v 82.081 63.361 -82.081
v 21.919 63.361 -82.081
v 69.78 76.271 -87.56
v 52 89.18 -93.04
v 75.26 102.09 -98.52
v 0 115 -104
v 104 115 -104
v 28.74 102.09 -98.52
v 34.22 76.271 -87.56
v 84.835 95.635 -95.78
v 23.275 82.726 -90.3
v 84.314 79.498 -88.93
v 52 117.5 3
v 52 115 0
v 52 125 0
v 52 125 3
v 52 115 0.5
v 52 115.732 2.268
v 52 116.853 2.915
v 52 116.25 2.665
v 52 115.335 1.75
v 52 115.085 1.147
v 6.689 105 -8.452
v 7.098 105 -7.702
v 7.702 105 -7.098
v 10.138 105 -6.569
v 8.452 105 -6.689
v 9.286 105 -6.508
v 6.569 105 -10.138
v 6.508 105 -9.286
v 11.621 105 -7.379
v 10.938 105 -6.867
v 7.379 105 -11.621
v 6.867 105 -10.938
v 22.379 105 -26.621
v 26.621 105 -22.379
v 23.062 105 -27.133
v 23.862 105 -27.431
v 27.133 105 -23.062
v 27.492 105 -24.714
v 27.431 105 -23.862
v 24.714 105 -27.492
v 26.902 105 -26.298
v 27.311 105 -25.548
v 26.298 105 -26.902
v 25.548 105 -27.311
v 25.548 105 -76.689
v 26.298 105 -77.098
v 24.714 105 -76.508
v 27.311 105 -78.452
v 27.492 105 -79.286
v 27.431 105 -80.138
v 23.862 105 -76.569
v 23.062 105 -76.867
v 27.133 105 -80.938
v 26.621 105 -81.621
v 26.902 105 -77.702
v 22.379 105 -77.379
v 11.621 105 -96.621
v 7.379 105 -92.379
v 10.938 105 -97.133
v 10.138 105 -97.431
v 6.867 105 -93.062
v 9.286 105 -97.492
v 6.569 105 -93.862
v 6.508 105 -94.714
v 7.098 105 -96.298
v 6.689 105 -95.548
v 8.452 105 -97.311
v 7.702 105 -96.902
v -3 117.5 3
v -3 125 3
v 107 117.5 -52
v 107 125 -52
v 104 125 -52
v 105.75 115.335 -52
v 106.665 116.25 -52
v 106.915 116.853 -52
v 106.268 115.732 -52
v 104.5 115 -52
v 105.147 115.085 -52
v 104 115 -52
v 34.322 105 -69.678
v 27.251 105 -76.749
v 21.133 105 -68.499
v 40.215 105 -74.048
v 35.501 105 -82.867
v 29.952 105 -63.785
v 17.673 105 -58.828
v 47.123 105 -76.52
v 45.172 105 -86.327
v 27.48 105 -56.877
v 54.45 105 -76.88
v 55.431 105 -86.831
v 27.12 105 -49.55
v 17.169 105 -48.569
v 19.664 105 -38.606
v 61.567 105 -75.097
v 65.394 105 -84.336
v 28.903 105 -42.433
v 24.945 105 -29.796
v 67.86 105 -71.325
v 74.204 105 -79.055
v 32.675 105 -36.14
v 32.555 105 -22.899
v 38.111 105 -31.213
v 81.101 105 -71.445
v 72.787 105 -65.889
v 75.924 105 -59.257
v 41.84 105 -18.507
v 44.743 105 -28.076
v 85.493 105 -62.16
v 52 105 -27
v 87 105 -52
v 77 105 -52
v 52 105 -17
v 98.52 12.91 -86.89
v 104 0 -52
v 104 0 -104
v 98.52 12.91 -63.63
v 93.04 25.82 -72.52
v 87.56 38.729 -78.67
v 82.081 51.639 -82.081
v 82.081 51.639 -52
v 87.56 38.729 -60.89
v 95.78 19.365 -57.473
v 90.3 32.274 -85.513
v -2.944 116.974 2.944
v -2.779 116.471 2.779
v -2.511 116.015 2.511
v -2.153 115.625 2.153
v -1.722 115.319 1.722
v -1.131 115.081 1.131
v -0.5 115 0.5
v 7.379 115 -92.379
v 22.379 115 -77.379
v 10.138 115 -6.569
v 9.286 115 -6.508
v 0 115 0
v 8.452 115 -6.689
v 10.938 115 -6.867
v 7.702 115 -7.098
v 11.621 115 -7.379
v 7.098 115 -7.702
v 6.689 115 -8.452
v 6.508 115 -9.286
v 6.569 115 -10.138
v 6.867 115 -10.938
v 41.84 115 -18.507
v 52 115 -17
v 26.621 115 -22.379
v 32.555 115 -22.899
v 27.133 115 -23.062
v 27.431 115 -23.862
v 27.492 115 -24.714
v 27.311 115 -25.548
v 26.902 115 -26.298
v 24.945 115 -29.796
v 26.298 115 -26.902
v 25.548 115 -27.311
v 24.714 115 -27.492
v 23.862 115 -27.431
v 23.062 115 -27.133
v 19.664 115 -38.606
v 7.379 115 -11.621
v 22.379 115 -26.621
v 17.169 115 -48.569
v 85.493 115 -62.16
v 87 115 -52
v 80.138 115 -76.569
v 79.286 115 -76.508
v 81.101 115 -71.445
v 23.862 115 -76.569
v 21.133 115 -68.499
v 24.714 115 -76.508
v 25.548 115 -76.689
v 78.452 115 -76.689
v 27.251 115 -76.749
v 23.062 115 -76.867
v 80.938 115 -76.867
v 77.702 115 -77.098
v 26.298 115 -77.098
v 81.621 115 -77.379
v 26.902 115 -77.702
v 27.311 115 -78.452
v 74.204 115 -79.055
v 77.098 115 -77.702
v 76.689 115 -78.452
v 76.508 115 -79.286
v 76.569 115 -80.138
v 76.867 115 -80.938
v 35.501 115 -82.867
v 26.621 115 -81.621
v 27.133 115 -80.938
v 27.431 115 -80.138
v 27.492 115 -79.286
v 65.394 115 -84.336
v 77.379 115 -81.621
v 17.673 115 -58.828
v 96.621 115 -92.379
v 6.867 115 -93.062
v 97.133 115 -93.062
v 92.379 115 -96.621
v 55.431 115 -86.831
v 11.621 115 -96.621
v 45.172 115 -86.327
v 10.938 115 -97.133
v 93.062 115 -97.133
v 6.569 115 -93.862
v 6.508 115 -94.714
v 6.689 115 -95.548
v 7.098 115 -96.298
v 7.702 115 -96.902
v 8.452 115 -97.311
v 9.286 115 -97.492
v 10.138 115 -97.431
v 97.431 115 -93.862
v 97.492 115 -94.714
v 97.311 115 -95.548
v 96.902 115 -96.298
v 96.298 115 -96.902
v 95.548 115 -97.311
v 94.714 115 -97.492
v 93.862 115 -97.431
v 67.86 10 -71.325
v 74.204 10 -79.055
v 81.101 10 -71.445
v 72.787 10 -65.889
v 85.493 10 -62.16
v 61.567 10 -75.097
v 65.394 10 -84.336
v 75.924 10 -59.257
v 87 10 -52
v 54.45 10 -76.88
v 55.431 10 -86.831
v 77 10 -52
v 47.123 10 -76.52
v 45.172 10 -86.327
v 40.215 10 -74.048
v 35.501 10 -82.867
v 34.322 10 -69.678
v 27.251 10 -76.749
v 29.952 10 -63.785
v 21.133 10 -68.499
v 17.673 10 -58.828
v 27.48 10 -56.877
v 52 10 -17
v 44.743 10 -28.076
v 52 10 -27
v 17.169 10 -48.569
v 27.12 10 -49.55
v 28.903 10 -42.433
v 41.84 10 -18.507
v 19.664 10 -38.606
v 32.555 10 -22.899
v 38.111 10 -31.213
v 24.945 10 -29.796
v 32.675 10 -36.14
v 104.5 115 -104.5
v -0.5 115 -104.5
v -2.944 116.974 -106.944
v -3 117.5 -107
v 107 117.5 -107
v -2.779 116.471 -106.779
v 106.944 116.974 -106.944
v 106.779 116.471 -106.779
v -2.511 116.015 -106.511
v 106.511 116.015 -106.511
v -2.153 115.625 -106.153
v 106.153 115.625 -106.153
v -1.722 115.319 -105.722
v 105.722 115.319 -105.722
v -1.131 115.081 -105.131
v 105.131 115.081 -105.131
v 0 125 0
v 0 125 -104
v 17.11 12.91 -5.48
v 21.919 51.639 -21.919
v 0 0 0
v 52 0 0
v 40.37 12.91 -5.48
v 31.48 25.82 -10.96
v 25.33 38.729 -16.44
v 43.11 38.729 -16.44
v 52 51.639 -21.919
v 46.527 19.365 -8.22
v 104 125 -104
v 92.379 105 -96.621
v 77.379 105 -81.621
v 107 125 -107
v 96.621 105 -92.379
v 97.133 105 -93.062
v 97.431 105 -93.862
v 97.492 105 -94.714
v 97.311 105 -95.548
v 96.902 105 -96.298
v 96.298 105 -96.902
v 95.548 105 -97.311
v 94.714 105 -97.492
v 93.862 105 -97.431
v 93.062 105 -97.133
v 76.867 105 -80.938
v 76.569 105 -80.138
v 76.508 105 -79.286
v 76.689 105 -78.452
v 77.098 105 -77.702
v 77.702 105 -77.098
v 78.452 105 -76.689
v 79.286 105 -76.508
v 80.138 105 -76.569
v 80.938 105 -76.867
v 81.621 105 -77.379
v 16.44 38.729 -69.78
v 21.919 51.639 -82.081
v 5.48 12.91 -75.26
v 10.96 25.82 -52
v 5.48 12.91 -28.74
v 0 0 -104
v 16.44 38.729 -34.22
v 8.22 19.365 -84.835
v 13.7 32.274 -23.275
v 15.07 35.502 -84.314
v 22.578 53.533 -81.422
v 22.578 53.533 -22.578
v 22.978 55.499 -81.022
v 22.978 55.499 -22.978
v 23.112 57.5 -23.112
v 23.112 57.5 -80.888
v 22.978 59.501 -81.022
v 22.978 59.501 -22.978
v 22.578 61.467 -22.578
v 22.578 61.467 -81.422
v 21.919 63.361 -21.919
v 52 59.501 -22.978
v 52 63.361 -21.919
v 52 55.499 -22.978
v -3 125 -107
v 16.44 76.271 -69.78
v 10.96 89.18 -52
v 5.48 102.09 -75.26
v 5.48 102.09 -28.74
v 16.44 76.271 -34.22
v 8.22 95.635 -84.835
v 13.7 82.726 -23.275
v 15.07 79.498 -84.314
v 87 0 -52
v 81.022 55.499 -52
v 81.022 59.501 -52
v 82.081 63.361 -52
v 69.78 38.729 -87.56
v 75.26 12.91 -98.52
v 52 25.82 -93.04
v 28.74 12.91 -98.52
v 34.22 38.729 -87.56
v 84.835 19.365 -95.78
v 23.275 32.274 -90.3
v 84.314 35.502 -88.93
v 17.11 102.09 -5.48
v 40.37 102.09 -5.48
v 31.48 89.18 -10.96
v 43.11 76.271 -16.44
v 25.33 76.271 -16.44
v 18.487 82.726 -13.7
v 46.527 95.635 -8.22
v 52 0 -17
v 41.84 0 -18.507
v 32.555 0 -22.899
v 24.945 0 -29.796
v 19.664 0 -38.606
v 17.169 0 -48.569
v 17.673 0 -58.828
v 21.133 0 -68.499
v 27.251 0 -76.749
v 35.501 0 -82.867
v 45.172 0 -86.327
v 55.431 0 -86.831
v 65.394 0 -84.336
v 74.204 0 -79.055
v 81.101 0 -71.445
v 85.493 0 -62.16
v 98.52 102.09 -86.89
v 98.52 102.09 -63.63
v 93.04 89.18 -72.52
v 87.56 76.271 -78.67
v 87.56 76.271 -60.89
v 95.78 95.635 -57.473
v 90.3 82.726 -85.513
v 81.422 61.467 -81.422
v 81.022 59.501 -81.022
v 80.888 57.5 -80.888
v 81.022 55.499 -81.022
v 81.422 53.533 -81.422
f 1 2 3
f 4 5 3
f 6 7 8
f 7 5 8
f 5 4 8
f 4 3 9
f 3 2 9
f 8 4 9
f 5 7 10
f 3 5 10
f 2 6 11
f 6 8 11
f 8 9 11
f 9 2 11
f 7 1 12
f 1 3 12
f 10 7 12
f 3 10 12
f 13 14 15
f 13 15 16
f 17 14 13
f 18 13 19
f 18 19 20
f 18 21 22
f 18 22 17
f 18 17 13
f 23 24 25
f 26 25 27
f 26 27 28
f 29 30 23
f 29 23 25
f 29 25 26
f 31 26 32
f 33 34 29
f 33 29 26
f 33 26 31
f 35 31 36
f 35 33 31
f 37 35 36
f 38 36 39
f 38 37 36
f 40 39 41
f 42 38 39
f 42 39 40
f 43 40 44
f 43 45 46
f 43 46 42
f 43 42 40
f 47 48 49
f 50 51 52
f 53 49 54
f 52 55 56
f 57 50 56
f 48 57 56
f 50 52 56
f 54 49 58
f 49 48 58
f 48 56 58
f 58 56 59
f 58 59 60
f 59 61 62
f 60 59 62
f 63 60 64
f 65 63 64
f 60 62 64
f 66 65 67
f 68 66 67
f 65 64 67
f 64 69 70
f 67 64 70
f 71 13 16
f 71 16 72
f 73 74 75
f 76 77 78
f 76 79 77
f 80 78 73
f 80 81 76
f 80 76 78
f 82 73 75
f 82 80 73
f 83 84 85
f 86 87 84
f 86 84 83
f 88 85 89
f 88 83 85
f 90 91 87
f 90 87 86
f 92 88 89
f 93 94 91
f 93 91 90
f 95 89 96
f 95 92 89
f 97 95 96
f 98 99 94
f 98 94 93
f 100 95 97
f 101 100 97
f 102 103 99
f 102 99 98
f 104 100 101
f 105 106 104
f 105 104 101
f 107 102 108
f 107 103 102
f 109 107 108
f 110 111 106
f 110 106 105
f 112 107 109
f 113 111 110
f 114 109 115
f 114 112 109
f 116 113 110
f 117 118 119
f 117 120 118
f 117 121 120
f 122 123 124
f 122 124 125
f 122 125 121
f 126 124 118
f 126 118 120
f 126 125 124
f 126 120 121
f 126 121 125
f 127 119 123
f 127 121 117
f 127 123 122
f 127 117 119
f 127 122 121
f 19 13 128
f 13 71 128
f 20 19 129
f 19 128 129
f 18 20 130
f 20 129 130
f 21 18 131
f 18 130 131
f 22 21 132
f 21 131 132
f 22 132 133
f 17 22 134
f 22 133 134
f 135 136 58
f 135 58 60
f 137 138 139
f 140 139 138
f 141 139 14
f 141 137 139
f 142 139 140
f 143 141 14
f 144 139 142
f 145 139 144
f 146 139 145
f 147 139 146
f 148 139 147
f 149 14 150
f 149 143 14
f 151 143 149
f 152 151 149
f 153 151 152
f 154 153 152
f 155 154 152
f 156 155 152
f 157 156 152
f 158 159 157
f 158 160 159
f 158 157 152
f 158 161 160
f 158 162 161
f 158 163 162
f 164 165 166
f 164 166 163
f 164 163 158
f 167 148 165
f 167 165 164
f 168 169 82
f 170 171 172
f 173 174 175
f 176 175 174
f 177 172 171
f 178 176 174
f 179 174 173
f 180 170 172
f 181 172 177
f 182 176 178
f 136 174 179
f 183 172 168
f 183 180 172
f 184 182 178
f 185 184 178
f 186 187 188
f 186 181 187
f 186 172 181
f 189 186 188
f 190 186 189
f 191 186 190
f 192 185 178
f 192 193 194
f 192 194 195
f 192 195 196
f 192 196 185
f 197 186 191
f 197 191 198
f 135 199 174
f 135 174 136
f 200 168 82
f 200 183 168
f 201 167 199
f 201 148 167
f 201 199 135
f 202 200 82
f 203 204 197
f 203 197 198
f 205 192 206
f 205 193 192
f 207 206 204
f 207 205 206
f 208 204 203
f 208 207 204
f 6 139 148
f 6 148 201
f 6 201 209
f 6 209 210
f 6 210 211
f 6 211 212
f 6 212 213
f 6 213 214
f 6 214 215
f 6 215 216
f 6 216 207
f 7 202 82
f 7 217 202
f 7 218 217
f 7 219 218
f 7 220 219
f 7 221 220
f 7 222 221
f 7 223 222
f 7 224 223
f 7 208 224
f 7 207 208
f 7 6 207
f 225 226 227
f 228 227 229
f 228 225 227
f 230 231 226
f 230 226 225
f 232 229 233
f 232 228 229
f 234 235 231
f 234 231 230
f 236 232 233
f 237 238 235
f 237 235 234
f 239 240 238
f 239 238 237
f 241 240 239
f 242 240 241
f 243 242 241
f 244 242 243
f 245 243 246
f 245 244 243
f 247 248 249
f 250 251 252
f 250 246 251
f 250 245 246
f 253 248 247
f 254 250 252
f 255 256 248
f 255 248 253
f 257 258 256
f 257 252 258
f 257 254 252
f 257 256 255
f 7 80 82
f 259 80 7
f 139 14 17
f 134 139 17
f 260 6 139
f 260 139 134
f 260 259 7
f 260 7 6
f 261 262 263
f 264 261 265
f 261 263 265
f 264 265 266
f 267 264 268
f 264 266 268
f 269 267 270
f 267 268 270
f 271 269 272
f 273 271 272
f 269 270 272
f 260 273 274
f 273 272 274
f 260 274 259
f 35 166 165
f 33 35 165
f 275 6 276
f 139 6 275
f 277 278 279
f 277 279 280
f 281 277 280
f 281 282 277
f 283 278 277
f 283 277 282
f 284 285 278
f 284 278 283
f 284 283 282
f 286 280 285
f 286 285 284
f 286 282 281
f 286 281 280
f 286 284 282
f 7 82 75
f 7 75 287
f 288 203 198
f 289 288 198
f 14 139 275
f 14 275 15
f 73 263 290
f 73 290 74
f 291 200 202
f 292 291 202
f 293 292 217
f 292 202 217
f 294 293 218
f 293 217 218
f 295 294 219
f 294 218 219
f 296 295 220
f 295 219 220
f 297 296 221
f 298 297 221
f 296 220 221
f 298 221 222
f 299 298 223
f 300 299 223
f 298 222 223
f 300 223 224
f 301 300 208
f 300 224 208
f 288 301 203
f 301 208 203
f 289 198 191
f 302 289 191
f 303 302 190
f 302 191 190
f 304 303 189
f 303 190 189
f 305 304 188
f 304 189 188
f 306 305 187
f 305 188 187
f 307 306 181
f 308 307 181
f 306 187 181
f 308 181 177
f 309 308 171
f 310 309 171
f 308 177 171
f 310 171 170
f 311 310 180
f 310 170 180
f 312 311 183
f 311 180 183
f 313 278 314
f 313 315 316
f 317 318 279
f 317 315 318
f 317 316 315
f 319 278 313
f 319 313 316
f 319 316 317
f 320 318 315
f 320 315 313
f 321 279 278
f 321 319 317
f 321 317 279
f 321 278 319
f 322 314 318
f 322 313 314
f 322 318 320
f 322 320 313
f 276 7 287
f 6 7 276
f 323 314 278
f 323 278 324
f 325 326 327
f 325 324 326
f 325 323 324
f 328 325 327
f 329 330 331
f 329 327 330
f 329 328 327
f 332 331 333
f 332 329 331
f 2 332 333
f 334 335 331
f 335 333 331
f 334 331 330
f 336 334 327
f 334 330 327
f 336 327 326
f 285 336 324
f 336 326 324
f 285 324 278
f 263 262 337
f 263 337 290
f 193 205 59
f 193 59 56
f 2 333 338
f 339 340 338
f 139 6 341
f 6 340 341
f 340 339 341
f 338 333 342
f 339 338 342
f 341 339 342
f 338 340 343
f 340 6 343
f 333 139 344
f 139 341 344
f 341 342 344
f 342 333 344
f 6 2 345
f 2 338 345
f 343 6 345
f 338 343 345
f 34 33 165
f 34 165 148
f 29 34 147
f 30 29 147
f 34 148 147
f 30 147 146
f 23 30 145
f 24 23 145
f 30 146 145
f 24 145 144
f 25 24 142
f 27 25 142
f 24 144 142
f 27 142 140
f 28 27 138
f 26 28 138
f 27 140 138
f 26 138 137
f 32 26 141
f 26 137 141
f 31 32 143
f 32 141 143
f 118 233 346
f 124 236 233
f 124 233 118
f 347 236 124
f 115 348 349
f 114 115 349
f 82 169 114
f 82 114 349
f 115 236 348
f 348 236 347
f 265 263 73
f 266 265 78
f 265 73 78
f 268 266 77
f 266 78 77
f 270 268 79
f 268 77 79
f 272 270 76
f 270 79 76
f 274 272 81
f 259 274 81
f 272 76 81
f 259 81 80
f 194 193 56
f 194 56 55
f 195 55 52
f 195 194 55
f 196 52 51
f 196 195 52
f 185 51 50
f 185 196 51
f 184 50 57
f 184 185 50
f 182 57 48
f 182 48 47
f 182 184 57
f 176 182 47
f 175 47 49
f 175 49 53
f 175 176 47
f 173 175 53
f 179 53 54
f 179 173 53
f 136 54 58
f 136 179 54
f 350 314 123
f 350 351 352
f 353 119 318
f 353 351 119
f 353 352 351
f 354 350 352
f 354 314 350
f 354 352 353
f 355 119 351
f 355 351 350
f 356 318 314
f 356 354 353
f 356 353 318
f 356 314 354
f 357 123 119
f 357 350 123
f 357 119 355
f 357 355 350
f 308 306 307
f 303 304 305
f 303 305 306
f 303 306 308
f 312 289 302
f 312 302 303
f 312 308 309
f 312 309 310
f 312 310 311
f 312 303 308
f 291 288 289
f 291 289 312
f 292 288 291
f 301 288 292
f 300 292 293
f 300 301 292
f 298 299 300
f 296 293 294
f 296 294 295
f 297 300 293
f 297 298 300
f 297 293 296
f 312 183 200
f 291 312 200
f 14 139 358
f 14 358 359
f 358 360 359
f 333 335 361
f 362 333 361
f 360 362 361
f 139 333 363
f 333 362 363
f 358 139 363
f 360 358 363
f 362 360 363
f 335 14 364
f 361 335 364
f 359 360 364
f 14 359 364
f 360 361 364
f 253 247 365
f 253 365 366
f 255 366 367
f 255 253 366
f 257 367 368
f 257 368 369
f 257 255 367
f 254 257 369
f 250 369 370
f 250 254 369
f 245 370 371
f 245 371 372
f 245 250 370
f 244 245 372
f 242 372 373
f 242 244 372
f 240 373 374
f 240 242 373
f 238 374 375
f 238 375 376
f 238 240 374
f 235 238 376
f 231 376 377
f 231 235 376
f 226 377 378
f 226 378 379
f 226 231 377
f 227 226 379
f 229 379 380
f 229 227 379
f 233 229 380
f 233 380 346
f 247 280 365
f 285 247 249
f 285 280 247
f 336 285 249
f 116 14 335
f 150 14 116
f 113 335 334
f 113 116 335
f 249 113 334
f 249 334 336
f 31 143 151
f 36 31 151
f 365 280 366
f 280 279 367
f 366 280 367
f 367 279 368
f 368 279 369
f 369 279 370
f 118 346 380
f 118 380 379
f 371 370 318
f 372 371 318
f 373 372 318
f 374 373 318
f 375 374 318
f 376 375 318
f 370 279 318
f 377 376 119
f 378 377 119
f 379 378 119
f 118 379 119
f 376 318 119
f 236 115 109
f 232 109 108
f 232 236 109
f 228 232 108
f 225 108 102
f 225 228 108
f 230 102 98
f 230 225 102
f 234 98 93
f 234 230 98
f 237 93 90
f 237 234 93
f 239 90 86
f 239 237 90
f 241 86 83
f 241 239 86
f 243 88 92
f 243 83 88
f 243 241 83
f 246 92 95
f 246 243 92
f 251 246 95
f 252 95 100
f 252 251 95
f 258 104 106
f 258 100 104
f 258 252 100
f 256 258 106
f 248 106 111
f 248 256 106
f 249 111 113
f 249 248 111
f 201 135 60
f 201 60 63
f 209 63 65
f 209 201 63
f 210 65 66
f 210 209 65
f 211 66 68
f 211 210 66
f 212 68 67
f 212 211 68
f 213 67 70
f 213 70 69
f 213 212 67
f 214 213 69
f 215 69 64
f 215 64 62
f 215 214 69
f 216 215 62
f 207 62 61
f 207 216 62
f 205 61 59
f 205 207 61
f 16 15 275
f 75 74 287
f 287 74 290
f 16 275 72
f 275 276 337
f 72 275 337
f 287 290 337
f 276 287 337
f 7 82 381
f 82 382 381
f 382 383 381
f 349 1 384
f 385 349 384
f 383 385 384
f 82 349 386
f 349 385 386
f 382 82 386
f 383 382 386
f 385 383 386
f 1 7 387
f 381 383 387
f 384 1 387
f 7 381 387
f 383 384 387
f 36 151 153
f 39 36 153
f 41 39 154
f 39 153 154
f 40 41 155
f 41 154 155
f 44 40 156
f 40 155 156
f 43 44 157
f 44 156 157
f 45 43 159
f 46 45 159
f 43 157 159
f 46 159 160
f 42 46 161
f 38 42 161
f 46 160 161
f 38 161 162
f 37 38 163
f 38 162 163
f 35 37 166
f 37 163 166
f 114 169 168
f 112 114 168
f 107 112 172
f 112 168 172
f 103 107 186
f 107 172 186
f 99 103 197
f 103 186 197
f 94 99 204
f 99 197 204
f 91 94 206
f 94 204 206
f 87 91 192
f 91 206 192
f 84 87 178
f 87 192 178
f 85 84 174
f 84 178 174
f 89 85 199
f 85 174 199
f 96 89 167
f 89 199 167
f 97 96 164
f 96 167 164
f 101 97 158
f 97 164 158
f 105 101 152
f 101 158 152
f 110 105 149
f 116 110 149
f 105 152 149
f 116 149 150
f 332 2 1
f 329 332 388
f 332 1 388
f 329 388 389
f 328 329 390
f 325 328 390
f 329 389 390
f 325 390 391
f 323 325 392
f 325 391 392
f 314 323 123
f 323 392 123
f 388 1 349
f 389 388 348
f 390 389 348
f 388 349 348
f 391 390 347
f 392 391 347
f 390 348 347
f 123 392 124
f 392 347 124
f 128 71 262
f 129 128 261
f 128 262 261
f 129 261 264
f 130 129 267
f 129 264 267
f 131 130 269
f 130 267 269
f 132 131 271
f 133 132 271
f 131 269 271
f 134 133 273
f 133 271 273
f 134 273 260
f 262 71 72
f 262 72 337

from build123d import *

# Parameters (mm, degrees)
SKETCH2_W               = 104
SKETCH2_H               = 104
BOSS_EXTRUDE1_DEPTH     = 57.5
BOSS_EXTRUDE1_TAPER     = 23
CUT_EXTRUDE1_DEPTH      = 187.700294763
CUT_EXTRUDE1_DEPTH_BACK = 187.700294763
SKETCH4_R               = 25
FILLET1_R               = 15
SKETCH5_R               = 35
CUT_EXTRUDE2_DEPTH      = 10
CUT_EXTRUDE3_START      = -10
SKETCH6_R               = 35
CUT_EXTRUDE3_DEPTH      = 10
SKETCH7_W               = 52
SKETCH7_H               = 52
CUT_EXTRUDE4_DEPTH      = 187.700294763
BOSS_EXTRUDE3_DEPTH     = 10
FILLET12_R              = 2.5
CUT_EXTRUDE5_DEPTH      = 10


with BuildPart() as part:
    # Sketch2 → Boss-Extrude1 (new body)
    with BuildSketch(Plane(origin=(0, 0, 0), x_dir=(1, 0, 0), z_dir=(0, 1, 0))):
        with Locations((52, 52)):
            Rectangle(SKETCH2_W, SKETCH2_H)
    extrude(amount=BOSS_EXTRUDE1_DEPTH, taper=BOSS_EXTRUDE1_TAPER)

    # Mirror2: part across plane


with BuildPart() as part_1:
    add(part.part)
    add(part.part.mirror(Plane(origin=(0, 57.5, 0), x_dir=(0, 0, 1), z_dir=(0, -1, 0))))

    # Sketch4 → Cut-Extrude1 (cut, two sides: drawn at the far end of the back side and taken through both)
    with BuildSketch(Plane(origin=(0, 115, 0), x_dir=(1, 0, 0), z_dir=(0, 1, 0)).offset(-CUT_EXTRUDE1_DEPTH_BACK)):
        with Locations(Location((52, 52, 0), (0, 0, 270))):
            Circle(SKETCH4_R)
    extrude(amount=CUT_EXTRUDE1_DEPTH + CUT_EXTRUDE1_DEPTH_BACK, mode=Mode.SUBTRACT)

    # Fillet1
    # the kernel refuses this fillet: 15 mm, written as the material it adds along each edge
    with BuildSketch(Plane(origin=(24.407301932, 57.5, -95.510503676), x_dir=(-0.39073112848927455, -0.9205048534524399, 0), z_dir=(0, 0, 1))) as fillet1_piece_1_section:
        with BuildLine():
            CenterArc((FILLET1_R * 0.42447481621, -FILLET1_R), FILLET1_R, 90, 46)
            Line((-FILLET1_R * 0.294864984129, -FILLET1_R * 0.305341629541), (0, 0))
            Line((0, 0), (FILLET1_R * 0.42447481621, 0))
        make_face()
    fillet1_piece_1 = extrude(amount=87.021007352, mode=Mode.PRIVATE)
    fillet1_piece_1 = fillet1_piece_1 - Plane(origin=(24.407301932, 57.5, -8.111896271), x_dir=(0, -0.39073112848927466, -0.9205048534524399), z_dir=(-1, 0, 0)) * Cylinder(15, 200, mode=Mode.PRIVATE)
    fillet1_piece_1 = fillet1_piece_1 - Plane(origin=(24.407301932, 57.5, -95.888103729), x_dir=(0, -0.3907311284892748, 0.9205048534524398), z_dir=(1, 0, 0)) * Cylinder(15, 200, mode=Mode.PRIVATE)
    add(fillet1_piece_1)
    with BuildSketch(Plane(origin=(8.489496324, 57.5, -24.407301932), x_dir=(0, -0.9205048534524399, 0.39073112848927455), z_dir=(1, 0, 0))) as fillet1_piece_2_section:
        with BuildLine():
            CenterArc((FILLET1_R * 0.42447481621, -FILLET1_R), FILLET1_R, 90, 46)
            Line((-FILLET1_R * 0.294864984129, -FILLET1_R * 0.305341629541), (0, 0))
            Line((0, 0), (FILLET1_R * 0.42447481621, 0))
        make_face()
    fillet1_piece_2 = extrude(amount=87.021007352, mode=Mode.PRIVATE)
    fillet1_piece_2 = fillet1_piece_2 - Plane(origin=(95.888103729, 57.5, -24.407301932), x_dir=(-0.9205048534524398, -0.3907311284892748, 0), z_dir=(0, 0, 1)) * Cylinder(15, 200, mode=Mode.PRIVATE)
    fillet1_piece_2 = fillet1_piece_2 - Plane(origin=(8.111896271, 57.5, -24.407301932), x_dir=(0.9205048534524399, -0.39073112848927466, 0), z_dir=(0, 0, -1)) * Cylinder(15, 200, mode=Mode.PRIVATE)
    add(fillet1_piece_2)
    with BuildSketch(Plane(origin=(79.592698068, 57.5, -8.489496324), x_dir=(0.39073112848927455, -0.9205048534524399, 0), z_dir=(0, 0, -1))) as fillet1_piece_3_section:
        with BuildLine():
            CenterArc((FILLET1_R * 0.42447481621, -FILLET1_R), FILLET1_R, 90, 46)
            Line((-FILLET1_R * 0.294864984129, -FILLET1_R * 0.305341629541), (0, 0))
            Line((0, 0), (FILLET1_R * 0.42447481621, 0))
        make_face()
    fillet1_piece_3 = extrude(amount=87.021007352, mode=Mode.PRIVATE)
    fillet1_piece_3 = fillet1_piece_3 - Plane(origin=(79.592698068, 57.5, -8.111896271), x_dir=(0, -0.39073112848927466, -0.9205048534524399), z_dir=(-1, 0, 0)) * Cylinder(15, 200, mode=Mode.PRIVATE)
    fillet1_piece_3 = fillet1_piece_3 - Plane(origin=(79.592698068, 57.5, -95.888103729), x_dir=(0, -0.3907311284892748, 0.9205048534524398), z_dir=(1, 0, 0)) * Cylinder(15, 200, mode=Mode.PRIVATE)
    add(fillet1_piece_3)
    with BuildSketch(Plane(origin=(95.510503676, 57.5, -79.592698068), x_dir=(0, -0.9205048534524399, -0.39073112848927455), z_dir=(-1, 0, 0))) as fillet1_piece_4_section:
        with BuildLine():
            CenterArc((FILLET1_R * 0.42447481621, -FILLET1_R), FILLET1_R, 90, 46)
            Line((-FILLET1_R * 0.294864984129, -FILLET1_R * 0.305341629541), (0, 0))
            Line((0, 0), (FILLET1_R * 0.42447481621, 0))
        make_face()
    fillet1_piece_4 = extrude(amount=87.021007352, mode=Mode.PRIVATE)
    fillet1_piece_4 = fillet1_piece_4 - Plane(origin=(95.888103729, 57.5, -79.592698068), x_dir=(-0.9205048534524398, -0.3907311284892748, 0), z_dir=(0, 0, 1)) * Cylinder(15, 200, mode=Mode.PRIVATE)
    fillet1_piece_4 = fillet1_piece_4 - Plane(origin=(8.111896271, 57.5, -79.592698068), x_dir=(0.9205048534524399, -0.39073112848927466, 0), z_dir=(0, 0, -1)) * Cylinder(15, 200, mode=Mode.PRIVATE)
    add(fillet1_piece_4)

    # Sketch5 → Cut-Extrude2 (cut)
    with BuildSketch(Plane(origin=(0, 115, 0), x_dir=(1, 0, 0), z_dir=(0, 1, 0))):
        with Locations(Location((52, 52, 0), (0, 0, 270))):
            Circle(SKETCH5_R)
    extrude(amount=-CUT_EXTRUDE2_DEPTH, mode=Mode.SUBTRACT)

    # Sketch6 → Cut-Extrude3 (cut)
    with BuildSketch(Plane.XZ.offset(CUT_EXTRUDE3_START)):
        with Locations(Location((52, -52, 0), (0, 0, 90))):
            Circle(SKETCH6_R)
    extrude(amount=CUT_EXTRUDE3_DEPTH, mode=Mode.SUBTRACT)

    # Sketch7 → Cut-Extrude4 (cut, through all)
    with BuildSketch(Plane(origin=(0, 115, 0), x_dir=(1, 0, 0), z_dir=(0, 1, 0))):
        with Locations((78, 26)):
            Rectangle(SKETCH7_W, SKETCH7_H)
    extrude(amount=-CUT_EXTRUDE4_DEPTH, mode=Mode.SUBTRACT)

    # Sketch10 → Cut-Extrude5 (cut)
    with BuildSketch(Plane(origin=(0, 115, 0), x_dir=(1, 0, 0), z_dir=(0, 1, 0))):
        with BuildLine():
            Line((11.621320344, 96.621320344), (26.621320344, 81.621320344))
            ThreePointArc((26.621320344, 81.621320344), (26.621320344, 77.378679656), (22.378679656, 77.378679656))
            Line((22.378679656, 77.378679656), (7.378679656, 92.378679656))
            ThreePointArc((7.378679656, 92.378679656), (7.378679656, 96.621320344), (11.621320344, 96.621320344))
        make_face()
        with BuildLine():
            Line((92.378679656, 96.621320344), (77.378679656, 81.621320344))
            ThreePointArc((77.378679656, 81.621320344), (77.378679656, 77.378679656), (81.621320344, 77.378679656))
            Line((81.621320344, 77.378679656), (96.621320344, 92.378679656))
            ThreePointArc((96.621320344, 92.378679656), (96.621320344, 96.621320344), (92.378679656, 96.621320344))
        make_face()
        with BuildLine():
            Line((11.621320344, 7.378679656), (26.621320344, 22.378679656))
            ThreePointArc((26.621320344, 22.378679656), (26.621320344, 26.621320344), (22.378679656, 26.621320344))
            Line((22.378679656, 26.621320344), (7.378679656, 11.621320344))
            ThreePointArc((7.378679656, 11.621320344), (7.378679656, 7.378679656), (11.621320344, 7.378679656))
        make_face()
    extrude(amount=-CUT_EXTRUDE5_DEPTH, mode=Mode.SUBTRACT)


with BuildPart() as body_2:
    # Sketch8 → Boss-Extrude3 (new body)
    with BuildSketch(Plane(origin=(0, 115, 0), x_dir=(1, 0, 0), z_dir=(0, 1, 0))):
        Polygon((104, 52), (104, 104), (0, 104), (0, 0), (52, 0), (52, -3), (-3, -3), (-3, 107), (107, 107), (107, 52), align=None)
    extrude(amount=BOSS_EXTRUDE3_DEPTH)

    # Fillet12
    fillet12_edges = [body_2.edges().sort_by_distance(p)[0] for p in [
        (24.5, 115, 3),
        (-3, 115, -52),
        (52, 115, -107),
        (107, 115, -79.5),
    ]]
    fillet(fillet12_edges, radius=FILLET12_R)


solid = Compound([part_1.part, body_2.part])
